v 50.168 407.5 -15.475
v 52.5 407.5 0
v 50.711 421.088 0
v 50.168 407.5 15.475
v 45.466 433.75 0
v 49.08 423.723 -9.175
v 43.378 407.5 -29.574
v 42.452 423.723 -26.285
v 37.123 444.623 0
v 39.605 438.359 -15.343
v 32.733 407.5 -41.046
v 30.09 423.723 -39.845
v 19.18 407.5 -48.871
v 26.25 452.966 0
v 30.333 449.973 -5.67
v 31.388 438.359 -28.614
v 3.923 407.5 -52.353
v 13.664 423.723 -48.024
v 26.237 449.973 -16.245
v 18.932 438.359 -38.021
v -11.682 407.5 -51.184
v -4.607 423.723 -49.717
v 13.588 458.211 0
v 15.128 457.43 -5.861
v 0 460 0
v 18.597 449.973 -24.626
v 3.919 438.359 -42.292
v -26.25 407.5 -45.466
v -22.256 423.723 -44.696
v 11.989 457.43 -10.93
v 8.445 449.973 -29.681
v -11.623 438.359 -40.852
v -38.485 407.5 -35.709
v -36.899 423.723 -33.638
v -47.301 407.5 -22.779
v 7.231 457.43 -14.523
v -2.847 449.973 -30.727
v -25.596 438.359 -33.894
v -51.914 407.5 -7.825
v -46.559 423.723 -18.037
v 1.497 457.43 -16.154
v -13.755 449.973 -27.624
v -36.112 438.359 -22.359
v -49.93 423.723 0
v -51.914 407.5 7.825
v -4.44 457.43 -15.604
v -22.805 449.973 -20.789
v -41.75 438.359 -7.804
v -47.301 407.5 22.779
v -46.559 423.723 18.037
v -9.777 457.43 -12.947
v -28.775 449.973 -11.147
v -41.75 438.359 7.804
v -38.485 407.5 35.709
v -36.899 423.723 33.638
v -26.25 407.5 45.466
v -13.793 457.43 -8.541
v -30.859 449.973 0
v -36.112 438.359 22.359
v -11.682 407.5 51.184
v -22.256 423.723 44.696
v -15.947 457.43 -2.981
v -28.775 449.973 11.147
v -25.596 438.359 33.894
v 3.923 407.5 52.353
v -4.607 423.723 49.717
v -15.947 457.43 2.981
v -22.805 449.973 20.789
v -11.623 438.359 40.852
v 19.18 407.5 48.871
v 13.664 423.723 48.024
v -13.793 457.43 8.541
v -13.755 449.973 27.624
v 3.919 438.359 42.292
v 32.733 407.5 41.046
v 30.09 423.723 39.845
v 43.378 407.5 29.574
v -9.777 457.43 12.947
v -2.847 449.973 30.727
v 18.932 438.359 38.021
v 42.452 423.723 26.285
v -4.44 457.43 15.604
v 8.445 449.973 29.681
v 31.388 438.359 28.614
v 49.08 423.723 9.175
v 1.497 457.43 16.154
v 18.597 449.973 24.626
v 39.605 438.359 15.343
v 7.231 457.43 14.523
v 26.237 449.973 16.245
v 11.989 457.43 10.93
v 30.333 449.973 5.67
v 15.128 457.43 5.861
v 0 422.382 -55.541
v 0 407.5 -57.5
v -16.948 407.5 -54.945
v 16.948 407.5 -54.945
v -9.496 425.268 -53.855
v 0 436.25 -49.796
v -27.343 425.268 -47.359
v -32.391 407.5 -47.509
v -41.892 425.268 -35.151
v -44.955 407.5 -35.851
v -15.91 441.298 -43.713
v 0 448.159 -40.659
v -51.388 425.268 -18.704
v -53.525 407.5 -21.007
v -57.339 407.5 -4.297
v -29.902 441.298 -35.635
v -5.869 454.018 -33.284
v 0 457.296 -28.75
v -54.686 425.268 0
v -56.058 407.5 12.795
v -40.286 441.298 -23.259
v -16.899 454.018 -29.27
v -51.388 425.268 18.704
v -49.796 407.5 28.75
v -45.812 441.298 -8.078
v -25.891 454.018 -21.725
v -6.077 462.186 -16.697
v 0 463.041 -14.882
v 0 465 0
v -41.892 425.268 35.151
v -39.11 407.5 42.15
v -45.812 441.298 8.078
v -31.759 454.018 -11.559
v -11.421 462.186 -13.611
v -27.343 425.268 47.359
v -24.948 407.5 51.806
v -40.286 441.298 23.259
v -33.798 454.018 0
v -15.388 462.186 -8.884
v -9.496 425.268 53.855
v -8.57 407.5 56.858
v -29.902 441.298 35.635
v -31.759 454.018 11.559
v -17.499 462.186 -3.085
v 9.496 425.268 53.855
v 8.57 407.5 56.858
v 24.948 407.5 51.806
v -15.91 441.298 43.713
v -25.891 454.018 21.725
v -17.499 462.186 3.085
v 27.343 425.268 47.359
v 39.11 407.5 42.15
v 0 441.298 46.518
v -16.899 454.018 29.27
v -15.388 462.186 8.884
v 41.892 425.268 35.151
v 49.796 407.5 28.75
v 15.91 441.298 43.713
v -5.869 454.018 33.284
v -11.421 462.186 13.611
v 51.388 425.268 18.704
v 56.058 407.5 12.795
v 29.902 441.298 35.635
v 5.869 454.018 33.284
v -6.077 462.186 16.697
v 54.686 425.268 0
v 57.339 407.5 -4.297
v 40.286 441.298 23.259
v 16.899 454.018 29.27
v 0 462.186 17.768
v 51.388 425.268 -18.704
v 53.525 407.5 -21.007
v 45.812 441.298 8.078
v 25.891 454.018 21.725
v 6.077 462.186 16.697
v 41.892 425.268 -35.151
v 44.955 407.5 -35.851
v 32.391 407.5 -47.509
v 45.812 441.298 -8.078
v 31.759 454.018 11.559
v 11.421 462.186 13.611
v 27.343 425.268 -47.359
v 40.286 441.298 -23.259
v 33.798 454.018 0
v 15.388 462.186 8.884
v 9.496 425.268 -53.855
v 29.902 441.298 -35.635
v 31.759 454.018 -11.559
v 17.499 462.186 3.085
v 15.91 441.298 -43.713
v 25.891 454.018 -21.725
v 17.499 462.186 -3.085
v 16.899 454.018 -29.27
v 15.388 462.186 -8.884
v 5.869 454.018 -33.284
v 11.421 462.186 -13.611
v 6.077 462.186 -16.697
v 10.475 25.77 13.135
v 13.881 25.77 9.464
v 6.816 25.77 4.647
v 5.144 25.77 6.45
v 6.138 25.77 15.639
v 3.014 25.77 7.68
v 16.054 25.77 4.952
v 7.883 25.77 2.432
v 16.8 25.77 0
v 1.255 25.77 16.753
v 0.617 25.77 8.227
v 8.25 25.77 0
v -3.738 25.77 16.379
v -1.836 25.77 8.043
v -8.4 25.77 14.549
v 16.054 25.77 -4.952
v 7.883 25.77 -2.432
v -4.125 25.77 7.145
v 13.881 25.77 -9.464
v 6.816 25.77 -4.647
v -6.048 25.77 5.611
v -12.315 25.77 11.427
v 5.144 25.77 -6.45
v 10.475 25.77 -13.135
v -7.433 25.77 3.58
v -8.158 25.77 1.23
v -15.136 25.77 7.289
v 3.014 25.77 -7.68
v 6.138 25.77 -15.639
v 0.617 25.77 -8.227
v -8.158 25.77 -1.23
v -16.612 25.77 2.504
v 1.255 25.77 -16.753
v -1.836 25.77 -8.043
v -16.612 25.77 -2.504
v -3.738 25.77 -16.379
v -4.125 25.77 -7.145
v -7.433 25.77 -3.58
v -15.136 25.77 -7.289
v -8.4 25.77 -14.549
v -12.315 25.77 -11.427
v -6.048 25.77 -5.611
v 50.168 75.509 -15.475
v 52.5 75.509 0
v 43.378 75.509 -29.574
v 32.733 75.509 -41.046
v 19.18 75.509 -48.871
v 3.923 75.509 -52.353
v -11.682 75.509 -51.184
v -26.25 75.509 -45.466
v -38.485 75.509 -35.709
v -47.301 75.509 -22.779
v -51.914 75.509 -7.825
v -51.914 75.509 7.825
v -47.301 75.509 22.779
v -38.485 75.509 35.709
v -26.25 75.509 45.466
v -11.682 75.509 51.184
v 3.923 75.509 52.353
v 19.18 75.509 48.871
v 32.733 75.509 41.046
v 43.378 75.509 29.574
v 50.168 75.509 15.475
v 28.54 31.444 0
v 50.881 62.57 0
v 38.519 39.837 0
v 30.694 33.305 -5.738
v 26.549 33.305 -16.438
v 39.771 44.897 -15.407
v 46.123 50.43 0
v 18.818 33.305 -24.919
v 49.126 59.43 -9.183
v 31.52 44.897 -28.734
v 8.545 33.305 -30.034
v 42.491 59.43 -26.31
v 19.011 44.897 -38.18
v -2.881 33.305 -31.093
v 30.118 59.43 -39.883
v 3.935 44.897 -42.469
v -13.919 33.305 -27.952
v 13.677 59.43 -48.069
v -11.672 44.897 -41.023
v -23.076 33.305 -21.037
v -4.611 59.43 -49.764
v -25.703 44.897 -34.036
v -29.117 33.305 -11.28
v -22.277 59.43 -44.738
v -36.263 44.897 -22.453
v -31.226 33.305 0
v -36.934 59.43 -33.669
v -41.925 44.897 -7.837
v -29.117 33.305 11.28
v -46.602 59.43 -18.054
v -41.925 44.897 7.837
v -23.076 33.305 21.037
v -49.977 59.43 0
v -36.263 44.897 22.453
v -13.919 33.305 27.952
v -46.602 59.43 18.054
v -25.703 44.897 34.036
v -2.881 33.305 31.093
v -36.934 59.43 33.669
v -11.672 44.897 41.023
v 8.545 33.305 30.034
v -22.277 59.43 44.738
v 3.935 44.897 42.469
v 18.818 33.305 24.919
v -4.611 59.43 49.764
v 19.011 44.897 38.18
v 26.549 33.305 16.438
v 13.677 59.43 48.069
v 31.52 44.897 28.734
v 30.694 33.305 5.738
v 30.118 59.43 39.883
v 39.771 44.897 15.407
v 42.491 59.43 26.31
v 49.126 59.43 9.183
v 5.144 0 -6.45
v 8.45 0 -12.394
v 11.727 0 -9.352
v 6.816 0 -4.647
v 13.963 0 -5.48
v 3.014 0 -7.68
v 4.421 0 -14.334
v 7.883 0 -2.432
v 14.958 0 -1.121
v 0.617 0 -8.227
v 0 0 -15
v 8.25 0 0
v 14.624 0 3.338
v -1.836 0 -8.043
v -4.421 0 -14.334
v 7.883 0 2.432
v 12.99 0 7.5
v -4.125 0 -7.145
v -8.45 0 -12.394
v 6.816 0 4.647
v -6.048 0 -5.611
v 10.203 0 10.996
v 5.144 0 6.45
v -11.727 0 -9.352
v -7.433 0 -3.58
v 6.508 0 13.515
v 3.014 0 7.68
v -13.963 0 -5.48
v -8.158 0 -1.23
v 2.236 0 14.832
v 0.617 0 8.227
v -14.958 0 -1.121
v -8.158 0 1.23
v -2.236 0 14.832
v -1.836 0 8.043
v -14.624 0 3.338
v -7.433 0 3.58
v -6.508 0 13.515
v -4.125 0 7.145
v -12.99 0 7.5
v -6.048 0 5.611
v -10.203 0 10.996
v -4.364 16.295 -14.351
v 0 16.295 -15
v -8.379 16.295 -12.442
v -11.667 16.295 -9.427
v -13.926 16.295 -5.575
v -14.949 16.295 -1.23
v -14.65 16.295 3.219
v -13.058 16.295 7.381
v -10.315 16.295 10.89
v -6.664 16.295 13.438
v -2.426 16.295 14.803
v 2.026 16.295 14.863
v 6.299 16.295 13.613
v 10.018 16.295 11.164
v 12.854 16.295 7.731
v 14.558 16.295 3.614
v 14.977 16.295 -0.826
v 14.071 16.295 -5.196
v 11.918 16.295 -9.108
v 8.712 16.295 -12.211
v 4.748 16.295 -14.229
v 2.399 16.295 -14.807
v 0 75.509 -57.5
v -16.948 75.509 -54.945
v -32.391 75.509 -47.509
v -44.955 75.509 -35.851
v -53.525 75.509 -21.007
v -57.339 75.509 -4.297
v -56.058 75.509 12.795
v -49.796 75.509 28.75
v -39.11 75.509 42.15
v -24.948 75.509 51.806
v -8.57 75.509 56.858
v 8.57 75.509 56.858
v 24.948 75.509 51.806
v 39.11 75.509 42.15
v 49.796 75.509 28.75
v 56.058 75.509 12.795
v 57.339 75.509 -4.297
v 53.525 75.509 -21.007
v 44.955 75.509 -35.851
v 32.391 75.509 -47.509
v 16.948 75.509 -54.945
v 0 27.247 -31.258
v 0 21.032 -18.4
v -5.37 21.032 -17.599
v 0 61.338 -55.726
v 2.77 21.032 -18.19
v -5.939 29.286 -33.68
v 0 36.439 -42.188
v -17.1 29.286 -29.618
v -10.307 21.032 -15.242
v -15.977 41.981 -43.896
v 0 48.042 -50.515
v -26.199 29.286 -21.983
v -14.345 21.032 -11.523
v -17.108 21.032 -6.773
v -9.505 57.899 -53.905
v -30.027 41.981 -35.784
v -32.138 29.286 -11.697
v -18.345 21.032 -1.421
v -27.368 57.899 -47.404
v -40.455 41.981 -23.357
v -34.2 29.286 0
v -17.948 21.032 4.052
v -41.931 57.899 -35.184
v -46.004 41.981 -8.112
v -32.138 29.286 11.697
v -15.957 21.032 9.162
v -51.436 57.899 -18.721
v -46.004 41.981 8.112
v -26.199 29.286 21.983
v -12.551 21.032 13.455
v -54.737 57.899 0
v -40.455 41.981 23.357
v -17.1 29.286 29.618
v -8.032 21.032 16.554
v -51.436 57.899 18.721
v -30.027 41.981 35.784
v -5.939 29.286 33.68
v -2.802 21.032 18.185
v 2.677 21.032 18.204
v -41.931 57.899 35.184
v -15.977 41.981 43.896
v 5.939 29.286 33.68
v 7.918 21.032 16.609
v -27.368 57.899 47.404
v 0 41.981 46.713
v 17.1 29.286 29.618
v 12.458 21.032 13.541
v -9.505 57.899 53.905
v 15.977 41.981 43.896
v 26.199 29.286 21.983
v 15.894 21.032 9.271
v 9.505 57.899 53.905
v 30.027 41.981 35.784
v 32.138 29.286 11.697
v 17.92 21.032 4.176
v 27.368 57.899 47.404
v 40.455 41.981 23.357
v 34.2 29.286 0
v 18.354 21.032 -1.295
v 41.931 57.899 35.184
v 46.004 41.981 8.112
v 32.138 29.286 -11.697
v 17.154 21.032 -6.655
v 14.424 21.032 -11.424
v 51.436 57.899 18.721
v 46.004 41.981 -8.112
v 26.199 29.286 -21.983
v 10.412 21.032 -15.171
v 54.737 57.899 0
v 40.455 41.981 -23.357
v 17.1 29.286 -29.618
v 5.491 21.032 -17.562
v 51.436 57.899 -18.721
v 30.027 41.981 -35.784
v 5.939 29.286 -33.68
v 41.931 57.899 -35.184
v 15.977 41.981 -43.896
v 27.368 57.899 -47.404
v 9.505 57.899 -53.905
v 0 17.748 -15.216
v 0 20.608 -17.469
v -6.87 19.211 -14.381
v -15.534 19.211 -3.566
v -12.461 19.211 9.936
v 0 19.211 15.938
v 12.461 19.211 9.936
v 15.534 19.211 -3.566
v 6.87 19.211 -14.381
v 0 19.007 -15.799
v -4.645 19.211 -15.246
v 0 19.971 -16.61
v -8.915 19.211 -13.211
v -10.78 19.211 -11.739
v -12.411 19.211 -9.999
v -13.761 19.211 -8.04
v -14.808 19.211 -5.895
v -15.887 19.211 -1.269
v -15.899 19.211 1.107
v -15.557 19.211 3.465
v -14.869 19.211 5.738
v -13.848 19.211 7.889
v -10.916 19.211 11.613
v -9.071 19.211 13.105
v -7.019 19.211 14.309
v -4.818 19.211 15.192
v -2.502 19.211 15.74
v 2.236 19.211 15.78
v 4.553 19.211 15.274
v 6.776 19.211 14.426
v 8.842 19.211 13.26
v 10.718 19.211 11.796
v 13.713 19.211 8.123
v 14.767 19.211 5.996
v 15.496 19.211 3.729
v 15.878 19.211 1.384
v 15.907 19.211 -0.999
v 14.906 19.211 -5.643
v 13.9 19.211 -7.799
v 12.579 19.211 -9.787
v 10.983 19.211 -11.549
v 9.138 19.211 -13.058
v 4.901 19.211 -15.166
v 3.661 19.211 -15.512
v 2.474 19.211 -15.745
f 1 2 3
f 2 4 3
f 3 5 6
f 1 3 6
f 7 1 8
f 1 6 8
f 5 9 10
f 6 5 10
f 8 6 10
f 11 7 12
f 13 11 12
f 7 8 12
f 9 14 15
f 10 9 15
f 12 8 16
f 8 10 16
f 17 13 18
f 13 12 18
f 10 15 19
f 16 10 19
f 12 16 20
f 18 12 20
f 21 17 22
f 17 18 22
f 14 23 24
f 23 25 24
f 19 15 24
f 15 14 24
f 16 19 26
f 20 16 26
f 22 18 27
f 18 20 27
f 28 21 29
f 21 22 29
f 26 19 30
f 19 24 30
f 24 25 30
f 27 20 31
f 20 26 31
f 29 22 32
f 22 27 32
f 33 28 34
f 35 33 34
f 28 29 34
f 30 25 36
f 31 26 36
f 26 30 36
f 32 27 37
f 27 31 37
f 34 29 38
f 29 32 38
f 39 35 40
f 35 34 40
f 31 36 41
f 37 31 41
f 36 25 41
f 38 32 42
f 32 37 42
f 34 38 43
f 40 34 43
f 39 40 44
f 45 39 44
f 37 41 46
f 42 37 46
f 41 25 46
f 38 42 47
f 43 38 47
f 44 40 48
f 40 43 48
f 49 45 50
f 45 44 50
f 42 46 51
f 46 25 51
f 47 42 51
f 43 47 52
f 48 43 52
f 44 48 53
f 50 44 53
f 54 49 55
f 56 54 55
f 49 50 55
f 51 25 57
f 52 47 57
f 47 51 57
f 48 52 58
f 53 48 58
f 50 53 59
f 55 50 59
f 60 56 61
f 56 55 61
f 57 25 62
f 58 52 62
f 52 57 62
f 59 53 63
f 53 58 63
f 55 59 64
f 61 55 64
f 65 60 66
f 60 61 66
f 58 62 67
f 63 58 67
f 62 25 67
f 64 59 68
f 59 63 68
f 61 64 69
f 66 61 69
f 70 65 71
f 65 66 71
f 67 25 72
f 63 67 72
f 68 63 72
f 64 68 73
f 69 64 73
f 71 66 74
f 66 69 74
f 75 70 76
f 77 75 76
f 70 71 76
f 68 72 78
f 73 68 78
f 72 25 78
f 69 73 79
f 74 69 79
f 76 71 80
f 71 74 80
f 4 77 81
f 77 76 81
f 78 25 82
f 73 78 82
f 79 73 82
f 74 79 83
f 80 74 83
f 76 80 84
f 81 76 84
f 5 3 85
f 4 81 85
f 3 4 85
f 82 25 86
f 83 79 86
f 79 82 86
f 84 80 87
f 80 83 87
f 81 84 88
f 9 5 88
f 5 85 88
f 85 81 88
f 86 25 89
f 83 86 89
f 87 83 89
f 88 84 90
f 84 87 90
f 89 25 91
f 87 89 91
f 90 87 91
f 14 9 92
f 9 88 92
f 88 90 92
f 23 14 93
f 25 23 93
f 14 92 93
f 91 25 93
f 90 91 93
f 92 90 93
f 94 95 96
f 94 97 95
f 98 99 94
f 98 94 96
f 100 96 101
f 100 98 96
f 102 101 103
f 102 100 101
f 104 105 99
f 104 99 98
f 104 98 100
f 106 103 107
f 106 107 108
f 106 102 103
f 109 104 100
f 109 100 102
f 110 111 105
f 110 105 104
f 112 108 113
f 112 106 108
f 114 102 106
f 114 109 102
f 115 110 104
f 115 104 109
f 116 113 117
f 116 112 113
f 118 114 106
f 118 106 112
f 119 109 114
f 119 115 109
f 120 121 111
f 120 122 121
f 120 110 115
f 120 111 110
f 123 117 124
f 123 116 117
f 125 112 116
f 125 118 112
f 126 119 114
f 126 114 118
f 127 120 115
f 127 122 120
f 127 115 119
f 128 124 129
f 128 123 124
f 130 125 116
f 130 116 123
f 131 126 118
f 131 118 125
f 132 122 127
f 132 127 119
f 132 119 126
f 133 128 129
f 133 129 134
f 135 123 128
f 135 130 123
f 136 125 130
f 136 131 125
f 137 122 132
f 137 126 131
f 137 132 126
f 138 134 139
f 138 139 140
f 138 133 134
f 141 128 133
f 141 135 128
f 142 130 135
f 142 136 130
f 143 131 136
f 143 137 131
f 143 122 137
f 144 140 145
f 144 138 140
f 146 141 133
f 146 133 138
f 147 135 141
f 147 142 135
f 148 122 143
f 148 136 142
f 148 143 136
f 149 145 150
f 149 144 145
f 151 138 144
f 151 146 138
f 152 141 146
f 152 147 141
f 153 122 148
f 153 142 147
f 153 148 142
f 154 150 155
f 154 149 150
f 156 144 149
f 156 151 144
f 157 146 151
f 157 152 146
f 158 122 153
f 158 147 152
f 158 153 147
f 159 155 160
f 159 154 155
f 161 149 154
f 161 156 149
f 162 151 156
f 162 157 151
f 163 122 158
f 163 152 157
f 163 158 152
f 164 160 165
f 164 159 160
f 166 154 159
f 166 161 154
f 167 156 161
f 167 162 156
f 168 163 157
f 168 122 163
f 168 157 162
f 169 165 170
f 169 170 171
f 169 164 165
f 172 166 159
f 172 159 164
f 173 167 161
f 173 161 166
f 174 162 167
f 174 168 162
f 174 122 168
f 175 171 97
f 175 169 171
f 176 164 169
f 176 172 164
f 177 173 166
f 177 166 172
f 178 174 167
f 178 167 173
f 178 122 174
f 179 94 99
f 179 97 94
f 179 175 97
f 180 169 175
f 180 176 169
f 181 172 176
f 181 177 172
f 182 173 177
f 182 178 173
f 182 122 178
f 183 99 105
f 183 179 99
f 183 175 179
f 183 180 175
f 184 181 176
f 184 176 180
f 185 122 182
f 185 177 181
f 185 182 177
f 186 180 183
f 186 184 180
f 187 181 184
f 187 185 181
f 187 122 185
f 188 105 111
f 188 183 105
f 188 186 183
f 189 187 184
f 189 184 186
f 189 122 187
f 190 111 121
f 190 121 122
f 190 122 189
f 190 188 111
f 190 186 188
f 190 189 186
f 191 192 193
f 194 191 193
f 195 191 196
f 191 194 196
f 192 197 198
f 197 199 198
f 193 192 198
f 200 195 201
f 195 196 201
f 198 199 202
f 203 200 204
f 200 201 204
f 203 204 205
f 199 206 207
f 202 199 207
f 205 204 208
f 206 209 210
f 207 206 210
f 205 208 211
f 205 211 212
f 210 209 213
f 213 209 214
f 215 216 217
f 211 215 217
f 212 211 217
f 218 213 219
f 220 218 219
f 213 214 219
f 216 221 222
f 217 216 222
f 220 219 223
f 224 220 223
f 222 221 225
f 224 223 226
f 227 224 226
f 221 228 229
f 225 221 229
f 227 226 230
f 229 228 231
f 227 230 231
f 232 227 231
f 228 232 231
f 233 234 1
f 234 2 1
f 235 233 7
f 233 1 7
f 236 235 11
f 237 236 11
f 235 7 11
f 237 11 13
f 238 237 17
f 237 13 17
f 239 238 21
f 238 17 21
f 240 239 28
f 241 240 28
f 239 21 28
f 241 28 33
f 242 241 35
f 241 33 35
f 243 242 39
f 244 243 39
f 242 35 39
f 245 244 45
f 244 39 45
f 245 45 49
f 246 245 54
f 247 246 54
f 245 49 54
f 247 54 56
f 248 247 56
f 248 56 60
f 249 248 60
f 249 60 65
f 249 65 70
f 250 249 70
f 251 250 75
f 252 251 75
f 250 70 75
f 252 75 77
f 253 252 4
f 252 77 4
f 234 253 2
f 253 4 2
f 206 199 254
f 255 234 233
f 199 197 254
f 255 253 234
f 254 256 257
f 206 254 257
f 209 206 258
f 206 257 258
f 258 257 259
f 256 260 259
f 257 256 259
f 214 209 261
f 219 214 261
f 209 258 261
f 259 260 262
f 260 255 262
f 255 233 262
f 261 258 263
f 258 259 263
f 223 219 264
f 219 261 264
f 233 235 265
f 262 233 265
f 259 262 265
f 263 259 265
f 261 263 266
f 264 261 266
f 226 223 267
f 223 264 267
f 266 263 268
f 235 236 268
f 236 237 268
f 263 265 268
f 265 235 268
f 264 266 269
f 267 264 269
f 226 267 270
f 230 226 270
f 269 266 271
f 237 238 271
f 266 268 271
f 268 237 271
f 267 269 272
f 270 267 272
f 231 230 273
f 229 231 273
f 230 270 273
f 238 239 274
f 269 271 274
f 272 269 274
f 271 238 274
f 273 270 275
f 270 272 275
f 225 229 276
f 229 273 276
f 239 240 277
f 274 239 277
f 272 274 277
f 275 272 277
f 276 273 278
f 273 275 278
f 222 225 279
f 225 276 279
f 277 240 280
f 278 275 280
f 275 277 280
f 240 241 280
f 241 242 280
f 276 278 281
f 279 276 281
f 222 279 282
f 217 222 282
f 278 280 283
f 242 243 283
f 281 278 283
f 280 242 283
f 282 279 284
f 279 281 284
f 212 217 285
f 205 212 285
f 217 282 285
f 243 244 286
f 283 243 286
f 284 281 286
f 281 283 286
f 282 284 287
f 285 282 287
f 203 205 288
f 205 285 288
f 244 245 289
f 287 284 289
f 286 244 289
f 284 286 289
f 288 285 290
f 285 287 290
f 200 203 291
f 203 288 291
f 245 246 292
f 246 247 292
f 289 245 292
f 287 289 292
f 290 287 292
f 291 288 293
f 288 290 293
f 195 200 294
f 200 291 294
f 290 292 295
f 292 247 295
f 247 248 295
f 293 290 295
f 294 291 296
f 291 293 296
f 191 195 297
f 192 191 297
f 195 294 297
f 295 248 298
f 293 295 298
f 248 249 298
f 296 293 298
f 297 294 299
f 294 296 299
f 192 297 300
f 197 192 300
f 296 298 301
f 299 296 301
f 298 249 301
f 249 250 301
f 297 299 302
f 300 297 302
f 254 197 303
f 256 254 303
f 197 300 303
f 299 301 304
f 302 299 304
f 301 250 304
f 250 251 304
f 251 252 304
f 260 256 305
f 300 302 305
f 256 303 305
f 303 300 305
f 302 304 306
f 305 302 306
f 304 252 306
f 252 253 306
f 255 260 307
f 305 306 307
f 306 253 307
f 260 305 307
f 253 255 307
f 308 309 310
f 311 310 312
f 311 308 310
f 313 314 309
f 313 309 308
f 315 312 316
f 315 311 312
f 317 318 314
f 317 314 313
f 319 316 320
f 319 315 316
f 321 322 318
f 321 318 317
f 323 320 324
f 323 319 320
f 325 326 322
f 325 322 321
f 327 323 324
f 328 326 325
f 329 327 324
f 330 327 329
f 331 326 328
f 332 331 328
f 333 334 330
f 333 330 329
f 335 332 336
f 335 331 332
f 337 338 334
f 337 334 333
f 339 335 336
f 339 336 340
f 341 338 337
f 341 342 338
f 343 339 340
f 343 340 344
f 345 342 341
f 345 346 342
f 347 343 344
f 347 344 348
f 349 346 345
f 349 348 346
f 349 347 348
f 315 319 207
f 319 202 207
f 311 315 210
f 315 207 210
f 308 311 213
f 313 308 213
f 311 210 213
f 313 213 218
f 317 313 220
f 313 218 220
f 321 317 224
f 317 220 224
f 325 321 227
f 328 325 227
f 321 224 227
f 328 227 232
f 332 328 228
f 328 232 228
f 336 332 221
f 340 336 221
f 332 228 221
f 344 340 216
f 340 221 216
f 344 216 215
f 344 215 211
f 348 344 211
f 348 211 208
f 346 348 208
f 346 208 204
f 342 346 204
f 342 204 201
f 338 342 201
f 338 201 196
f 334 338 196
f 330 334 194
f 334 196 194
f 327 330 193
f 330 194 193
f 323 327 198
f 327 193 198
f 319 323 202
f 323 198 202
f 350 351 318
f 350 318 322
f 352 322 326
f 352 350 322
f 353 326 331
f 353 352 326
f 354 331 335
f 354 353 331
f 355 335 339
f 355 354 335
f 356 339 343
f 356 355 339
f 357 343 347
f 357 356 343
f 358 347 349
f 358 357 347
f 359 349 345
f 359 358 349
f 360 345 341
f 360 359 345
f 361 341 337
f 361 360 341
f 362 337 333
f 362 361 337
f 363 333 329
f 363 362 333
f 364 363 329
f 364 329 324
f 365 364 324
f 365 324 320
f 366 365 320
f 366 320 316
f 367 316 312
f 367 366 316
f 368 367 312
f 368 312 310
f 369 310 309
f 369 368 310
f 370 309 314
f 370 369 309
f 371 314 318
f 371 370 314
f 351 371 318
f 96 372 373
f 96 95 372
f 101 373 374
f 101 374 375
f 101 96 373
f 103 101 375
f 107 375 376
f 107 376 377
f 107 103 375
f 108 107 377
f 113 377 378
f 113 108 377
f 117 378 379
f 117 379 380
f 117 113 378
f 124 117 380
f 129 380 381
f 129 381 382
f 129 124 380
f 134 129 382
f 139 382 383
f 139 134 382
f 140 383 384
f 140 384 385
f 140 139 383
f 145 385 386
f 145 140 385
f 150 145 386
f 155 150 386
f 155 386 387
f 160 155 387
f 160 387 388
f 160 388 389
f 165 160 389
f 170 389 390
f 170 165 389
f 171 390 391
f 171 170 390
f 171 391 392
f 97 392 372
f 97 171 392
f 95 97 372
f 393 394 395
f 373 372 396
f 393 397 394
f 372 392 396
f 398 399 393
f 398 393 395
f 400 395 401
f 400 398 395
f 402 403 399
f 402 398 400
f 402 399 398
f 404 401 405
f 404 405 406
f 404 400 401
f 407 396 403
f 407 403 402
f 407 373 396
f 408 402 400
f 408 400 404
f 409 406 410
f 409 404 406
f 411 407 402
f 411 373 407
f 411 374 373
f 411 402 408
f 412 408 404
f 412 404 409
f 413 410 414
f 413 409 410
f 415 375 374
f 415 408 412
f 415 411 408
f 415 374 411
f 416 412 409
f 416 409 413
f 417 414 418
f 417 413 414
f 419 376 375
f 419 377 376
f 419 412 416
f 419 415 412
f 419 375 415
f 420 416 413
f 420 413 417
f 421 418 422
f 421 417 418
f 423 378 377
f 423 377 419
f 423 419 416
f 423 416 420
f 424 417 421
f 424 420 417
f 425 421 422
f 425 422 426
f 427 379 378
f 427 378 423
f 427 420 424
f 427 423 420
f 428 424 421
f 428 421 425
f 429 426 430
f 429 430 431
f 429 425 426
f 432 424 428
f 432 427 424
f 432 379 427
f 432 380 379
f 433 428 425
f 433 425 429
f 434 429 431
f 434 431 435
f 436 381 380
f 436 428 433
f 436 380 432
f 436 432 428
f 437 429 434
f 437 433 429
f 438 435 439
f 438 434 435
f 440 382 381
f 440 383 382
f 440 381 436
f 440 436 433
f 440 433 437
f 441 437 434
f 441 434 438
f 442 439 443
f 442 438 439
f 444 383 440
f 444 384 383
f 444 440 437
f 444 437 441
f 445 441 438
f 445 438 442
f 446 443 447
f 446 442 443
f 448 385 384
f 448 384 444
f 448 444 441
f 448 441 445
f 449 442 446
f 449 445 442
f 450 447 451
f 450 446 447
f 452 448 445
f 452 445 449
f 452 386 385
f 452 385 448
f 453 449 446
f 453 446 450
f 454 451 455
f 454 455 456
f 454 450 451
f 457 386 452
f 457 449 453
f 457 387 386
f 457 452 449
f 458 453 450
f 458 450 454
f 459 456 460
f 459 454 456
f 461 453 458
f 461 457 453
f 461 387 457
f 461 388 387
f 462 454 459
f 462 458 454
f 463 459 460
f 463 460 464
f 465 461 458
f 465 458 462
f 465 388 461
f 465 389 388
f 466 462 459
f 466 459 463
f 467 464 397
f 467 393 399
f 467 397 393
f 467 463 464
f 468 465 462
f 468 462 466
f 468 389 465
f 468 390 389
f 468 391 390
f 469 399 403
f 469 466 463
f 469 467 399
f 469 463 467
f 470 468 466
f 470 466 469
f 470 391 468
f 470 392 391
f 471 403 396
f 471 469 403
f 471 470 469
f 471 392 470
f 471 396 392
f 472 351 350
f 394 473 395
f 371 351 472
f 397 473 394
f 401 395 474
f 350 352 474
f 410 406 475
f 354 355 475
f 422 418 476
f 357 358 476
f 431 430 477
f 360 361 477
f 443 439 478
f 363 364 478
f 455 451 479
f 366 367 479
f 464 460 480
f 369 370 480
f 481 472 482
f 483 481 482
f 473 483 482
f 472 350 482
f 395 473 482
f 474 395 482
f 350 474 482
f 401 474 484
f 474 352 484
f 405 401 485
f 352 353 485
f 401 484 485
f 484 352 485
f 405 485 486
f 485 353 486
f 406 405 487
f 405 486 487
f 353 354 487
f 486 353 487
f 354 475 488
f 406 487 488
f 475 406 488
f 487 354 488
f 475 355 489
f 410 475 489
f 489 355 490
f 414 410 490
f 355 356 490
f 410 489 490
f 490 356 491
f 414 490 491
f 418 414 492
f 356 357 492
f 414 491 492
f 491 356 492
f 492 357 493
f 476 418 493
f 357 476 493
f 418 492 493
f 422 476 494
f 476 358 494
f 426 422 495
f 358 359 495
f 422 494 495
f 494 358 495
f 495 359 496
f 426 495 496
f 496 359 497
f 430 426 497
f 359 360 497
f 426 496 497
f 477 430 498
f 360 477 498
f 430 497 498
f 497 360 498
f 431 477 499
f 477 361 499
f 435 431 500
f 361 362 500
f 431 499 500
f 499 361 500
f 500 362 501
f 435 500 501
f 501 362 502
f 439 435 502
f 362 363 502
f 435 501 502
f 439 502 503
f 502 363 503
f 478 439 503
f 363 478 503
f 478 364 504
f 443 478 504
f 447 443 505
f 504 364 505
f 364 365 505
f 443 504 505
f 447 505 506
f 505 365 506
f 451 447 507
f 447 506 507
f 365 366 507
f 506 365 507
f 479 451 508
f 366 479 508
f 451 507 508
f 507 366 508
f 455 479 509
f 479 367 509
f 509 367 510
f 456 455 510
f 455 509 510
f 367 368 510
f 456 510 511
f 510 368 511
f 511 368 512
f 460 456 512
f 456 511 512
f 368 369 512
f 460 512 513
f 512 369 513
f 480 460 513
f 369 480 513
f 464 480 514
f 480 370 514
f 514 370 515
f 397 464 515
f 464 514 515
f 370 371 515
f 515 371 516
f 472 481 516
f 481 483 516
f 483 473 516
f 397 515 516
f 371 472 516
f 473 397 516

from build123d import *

# Parameters (mm, degrees)
M18X1_5_TAPPED_HOLE1_D     = 16.5
M18X1_5_TAPPED_HOLE1_DEPTH = 15.042899893
M18X1_5_TAPPED_HOLE1_TIP   = 4.957100107
FILLET1_R                  = 5


with BuildPart() as part:
    # Sketch1 → Revolve1 (revolve)
    with BuildSketch(Plane.XY, mode=Mode.PRIVATE) as revolve1_sk:
        with BuildLine():
            Line((0, 0), (15, 0))
            Line((15, 0), (15, 20))
            ThreePointArc((15, 20), (45.654955919, 40.553679643), (57.5, 75.509008278))
            Line((57.5, 75.509008278), (57.5, 407.5))
            ThreePointArc((57.5, 407.5), (40.658639918, 448.158639918), (0, 465))
            Line((0, 465), (0, 0))
        make_face()
    revolve(revolve1_sk.sketch.rotate(Axis((0, 0, 0), (0, 1, 0)), 90), axis=Axis((0, 0, 0), (0, 1, 0)))

    # M18x1.5 Tapped Hole1
    with Locations(Plane(origin=(0, 0, 0), x_dir=(-1, 0, 0), z_dir=(0, -1, 0))):
        with Locations((0, 0)):
            Hole(M18X1_5_TAPPED_HOLE1_D / 2, depth=M18X1_5_TAPPED_HOLE1_DEPTH)
            with Locations((0, 0, -(M18X1_5_TAPPED_HOLE1_DEPTH + M18X1_5_TAPPED_HOLE1_TIP / 2))):  # 118° drill point
                Cone(0, M18X1_5_TAPPED_HOLE1_D / 2, M18X1_5_TAPPED_HOLE1_TIP, mode=Mode.SUBTRACT)

    # Fillet1
    fillet1_edges = [part.edges().sort_by_distance(p)[0] for p in [
        (0, 20, 15),
    ]]
    fillet(fillet1_edges, radius=FILLET1_R)

    # Sketch4 → Cut-Revolve1 (revolve, cut)
    with BuildSketch(Plane.XY):
        with BuildLine():
            Line((8.25, 15.042899893), (8.25, 25.769587292))
            Line((8.25, 25.769587292), (16.8, 25.769587292))
            ThreePointArc((16.8, 25.769587292), (42.651201624, 44.89651083), (52.5, 75.509008278))
            Line((52.5, 75.509008278), (52.5, 407.5))
            ThreePointArc((52.5, 407.5), (37.123106012, 444.623106012), (0, 460))
            Line((0, 460), (0, 15.042899893))
            Line((0, 15.042899893), (8.25, 15.042899893))
        make_face()
    revolve(axis=Axis((0, 0, 0), (0, 1, 0)), mode=Mode.SUBTRACT)


solid = part.part
